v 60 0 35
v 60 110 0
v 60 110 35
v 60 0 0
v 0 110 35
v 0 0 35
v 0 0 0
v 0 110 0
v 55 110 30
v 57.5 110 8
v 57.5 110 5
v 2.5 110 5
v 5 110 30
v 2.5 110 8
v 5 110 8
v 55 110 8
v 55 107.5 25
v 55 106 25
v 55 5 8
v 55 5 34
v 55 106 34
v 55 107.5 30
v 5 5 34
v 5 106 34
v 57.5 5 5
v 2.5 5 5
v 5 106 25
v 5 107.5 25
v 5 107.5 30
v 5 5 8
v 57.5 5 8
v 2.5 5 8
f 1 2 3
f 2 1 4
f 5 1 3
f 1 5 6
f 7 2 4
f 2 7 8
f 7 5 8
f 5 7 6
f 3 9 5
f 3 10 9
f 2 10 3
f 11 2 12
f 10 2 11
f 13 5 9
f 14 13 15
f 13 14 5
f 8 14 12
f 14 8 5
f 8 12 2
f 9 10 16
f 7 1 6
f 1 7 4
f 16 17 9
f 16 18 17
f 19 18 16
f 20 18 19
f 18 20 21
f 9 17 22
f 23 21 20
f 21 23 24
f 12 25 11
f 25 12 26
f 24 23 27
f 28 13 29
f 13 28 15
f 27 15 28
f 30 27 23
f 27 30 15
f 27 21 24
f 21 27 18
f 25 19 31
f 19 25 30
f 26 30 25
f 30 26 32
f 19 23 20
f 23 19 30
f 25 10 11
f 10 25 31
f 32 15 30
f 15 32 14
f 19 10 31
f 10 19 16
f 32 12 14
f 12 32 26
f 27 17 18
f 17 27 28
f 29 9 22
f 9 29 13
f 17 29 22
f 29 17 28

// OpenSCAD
LightBox(60,110,25);

module LightBox(W,L,FaceH)
{
	//W: Width of the Lightbox
	//L: Lengths of the lightbox
	//FaceH://Height of the faceplate of the insert
	difference()
	{
		Wall=5; //Wall and bottom Thickness
		H=FaceH+(Wall*2); //Height of the box is the height of the Faceplate plus two walls
		Top=1; //Thickness of the top of the box
		SlotH=3; //Slot height for the slide in insert
		SlotW=2.5; //Width of the tab for the slot
		FaceT=2; //Thickness of the Faceplate
		Buffer=1;//Extra space required to cut through other objects.
		TwoWall = Wall*2; //Two walls combined width
		InsertW=(Wall-SlotW)*2; //Total Width of the insert

		cube([W,L,H]); //Initial starting box
		translate([Wall,Wall,Wall]) cube([W-TwoWall,L-(TwoWall-Buffer),H-Wall-Top]); //Hollows out the initial box
		translate([Wall-SlotW,Wall,Wall]) cube([W-InsertW,L,SlotH]); //Hollows out room for slot
		translate([Wall,L-Wall,Wall]) cube([W-TwoWall,Wall,FaceH-Wall]); //Hollows out an opening for the insert
		translate([Wall,L-SlotW,Wall]) cube([W-TwoWall,FaceT+Buffer,FaceH]);
	}
}
